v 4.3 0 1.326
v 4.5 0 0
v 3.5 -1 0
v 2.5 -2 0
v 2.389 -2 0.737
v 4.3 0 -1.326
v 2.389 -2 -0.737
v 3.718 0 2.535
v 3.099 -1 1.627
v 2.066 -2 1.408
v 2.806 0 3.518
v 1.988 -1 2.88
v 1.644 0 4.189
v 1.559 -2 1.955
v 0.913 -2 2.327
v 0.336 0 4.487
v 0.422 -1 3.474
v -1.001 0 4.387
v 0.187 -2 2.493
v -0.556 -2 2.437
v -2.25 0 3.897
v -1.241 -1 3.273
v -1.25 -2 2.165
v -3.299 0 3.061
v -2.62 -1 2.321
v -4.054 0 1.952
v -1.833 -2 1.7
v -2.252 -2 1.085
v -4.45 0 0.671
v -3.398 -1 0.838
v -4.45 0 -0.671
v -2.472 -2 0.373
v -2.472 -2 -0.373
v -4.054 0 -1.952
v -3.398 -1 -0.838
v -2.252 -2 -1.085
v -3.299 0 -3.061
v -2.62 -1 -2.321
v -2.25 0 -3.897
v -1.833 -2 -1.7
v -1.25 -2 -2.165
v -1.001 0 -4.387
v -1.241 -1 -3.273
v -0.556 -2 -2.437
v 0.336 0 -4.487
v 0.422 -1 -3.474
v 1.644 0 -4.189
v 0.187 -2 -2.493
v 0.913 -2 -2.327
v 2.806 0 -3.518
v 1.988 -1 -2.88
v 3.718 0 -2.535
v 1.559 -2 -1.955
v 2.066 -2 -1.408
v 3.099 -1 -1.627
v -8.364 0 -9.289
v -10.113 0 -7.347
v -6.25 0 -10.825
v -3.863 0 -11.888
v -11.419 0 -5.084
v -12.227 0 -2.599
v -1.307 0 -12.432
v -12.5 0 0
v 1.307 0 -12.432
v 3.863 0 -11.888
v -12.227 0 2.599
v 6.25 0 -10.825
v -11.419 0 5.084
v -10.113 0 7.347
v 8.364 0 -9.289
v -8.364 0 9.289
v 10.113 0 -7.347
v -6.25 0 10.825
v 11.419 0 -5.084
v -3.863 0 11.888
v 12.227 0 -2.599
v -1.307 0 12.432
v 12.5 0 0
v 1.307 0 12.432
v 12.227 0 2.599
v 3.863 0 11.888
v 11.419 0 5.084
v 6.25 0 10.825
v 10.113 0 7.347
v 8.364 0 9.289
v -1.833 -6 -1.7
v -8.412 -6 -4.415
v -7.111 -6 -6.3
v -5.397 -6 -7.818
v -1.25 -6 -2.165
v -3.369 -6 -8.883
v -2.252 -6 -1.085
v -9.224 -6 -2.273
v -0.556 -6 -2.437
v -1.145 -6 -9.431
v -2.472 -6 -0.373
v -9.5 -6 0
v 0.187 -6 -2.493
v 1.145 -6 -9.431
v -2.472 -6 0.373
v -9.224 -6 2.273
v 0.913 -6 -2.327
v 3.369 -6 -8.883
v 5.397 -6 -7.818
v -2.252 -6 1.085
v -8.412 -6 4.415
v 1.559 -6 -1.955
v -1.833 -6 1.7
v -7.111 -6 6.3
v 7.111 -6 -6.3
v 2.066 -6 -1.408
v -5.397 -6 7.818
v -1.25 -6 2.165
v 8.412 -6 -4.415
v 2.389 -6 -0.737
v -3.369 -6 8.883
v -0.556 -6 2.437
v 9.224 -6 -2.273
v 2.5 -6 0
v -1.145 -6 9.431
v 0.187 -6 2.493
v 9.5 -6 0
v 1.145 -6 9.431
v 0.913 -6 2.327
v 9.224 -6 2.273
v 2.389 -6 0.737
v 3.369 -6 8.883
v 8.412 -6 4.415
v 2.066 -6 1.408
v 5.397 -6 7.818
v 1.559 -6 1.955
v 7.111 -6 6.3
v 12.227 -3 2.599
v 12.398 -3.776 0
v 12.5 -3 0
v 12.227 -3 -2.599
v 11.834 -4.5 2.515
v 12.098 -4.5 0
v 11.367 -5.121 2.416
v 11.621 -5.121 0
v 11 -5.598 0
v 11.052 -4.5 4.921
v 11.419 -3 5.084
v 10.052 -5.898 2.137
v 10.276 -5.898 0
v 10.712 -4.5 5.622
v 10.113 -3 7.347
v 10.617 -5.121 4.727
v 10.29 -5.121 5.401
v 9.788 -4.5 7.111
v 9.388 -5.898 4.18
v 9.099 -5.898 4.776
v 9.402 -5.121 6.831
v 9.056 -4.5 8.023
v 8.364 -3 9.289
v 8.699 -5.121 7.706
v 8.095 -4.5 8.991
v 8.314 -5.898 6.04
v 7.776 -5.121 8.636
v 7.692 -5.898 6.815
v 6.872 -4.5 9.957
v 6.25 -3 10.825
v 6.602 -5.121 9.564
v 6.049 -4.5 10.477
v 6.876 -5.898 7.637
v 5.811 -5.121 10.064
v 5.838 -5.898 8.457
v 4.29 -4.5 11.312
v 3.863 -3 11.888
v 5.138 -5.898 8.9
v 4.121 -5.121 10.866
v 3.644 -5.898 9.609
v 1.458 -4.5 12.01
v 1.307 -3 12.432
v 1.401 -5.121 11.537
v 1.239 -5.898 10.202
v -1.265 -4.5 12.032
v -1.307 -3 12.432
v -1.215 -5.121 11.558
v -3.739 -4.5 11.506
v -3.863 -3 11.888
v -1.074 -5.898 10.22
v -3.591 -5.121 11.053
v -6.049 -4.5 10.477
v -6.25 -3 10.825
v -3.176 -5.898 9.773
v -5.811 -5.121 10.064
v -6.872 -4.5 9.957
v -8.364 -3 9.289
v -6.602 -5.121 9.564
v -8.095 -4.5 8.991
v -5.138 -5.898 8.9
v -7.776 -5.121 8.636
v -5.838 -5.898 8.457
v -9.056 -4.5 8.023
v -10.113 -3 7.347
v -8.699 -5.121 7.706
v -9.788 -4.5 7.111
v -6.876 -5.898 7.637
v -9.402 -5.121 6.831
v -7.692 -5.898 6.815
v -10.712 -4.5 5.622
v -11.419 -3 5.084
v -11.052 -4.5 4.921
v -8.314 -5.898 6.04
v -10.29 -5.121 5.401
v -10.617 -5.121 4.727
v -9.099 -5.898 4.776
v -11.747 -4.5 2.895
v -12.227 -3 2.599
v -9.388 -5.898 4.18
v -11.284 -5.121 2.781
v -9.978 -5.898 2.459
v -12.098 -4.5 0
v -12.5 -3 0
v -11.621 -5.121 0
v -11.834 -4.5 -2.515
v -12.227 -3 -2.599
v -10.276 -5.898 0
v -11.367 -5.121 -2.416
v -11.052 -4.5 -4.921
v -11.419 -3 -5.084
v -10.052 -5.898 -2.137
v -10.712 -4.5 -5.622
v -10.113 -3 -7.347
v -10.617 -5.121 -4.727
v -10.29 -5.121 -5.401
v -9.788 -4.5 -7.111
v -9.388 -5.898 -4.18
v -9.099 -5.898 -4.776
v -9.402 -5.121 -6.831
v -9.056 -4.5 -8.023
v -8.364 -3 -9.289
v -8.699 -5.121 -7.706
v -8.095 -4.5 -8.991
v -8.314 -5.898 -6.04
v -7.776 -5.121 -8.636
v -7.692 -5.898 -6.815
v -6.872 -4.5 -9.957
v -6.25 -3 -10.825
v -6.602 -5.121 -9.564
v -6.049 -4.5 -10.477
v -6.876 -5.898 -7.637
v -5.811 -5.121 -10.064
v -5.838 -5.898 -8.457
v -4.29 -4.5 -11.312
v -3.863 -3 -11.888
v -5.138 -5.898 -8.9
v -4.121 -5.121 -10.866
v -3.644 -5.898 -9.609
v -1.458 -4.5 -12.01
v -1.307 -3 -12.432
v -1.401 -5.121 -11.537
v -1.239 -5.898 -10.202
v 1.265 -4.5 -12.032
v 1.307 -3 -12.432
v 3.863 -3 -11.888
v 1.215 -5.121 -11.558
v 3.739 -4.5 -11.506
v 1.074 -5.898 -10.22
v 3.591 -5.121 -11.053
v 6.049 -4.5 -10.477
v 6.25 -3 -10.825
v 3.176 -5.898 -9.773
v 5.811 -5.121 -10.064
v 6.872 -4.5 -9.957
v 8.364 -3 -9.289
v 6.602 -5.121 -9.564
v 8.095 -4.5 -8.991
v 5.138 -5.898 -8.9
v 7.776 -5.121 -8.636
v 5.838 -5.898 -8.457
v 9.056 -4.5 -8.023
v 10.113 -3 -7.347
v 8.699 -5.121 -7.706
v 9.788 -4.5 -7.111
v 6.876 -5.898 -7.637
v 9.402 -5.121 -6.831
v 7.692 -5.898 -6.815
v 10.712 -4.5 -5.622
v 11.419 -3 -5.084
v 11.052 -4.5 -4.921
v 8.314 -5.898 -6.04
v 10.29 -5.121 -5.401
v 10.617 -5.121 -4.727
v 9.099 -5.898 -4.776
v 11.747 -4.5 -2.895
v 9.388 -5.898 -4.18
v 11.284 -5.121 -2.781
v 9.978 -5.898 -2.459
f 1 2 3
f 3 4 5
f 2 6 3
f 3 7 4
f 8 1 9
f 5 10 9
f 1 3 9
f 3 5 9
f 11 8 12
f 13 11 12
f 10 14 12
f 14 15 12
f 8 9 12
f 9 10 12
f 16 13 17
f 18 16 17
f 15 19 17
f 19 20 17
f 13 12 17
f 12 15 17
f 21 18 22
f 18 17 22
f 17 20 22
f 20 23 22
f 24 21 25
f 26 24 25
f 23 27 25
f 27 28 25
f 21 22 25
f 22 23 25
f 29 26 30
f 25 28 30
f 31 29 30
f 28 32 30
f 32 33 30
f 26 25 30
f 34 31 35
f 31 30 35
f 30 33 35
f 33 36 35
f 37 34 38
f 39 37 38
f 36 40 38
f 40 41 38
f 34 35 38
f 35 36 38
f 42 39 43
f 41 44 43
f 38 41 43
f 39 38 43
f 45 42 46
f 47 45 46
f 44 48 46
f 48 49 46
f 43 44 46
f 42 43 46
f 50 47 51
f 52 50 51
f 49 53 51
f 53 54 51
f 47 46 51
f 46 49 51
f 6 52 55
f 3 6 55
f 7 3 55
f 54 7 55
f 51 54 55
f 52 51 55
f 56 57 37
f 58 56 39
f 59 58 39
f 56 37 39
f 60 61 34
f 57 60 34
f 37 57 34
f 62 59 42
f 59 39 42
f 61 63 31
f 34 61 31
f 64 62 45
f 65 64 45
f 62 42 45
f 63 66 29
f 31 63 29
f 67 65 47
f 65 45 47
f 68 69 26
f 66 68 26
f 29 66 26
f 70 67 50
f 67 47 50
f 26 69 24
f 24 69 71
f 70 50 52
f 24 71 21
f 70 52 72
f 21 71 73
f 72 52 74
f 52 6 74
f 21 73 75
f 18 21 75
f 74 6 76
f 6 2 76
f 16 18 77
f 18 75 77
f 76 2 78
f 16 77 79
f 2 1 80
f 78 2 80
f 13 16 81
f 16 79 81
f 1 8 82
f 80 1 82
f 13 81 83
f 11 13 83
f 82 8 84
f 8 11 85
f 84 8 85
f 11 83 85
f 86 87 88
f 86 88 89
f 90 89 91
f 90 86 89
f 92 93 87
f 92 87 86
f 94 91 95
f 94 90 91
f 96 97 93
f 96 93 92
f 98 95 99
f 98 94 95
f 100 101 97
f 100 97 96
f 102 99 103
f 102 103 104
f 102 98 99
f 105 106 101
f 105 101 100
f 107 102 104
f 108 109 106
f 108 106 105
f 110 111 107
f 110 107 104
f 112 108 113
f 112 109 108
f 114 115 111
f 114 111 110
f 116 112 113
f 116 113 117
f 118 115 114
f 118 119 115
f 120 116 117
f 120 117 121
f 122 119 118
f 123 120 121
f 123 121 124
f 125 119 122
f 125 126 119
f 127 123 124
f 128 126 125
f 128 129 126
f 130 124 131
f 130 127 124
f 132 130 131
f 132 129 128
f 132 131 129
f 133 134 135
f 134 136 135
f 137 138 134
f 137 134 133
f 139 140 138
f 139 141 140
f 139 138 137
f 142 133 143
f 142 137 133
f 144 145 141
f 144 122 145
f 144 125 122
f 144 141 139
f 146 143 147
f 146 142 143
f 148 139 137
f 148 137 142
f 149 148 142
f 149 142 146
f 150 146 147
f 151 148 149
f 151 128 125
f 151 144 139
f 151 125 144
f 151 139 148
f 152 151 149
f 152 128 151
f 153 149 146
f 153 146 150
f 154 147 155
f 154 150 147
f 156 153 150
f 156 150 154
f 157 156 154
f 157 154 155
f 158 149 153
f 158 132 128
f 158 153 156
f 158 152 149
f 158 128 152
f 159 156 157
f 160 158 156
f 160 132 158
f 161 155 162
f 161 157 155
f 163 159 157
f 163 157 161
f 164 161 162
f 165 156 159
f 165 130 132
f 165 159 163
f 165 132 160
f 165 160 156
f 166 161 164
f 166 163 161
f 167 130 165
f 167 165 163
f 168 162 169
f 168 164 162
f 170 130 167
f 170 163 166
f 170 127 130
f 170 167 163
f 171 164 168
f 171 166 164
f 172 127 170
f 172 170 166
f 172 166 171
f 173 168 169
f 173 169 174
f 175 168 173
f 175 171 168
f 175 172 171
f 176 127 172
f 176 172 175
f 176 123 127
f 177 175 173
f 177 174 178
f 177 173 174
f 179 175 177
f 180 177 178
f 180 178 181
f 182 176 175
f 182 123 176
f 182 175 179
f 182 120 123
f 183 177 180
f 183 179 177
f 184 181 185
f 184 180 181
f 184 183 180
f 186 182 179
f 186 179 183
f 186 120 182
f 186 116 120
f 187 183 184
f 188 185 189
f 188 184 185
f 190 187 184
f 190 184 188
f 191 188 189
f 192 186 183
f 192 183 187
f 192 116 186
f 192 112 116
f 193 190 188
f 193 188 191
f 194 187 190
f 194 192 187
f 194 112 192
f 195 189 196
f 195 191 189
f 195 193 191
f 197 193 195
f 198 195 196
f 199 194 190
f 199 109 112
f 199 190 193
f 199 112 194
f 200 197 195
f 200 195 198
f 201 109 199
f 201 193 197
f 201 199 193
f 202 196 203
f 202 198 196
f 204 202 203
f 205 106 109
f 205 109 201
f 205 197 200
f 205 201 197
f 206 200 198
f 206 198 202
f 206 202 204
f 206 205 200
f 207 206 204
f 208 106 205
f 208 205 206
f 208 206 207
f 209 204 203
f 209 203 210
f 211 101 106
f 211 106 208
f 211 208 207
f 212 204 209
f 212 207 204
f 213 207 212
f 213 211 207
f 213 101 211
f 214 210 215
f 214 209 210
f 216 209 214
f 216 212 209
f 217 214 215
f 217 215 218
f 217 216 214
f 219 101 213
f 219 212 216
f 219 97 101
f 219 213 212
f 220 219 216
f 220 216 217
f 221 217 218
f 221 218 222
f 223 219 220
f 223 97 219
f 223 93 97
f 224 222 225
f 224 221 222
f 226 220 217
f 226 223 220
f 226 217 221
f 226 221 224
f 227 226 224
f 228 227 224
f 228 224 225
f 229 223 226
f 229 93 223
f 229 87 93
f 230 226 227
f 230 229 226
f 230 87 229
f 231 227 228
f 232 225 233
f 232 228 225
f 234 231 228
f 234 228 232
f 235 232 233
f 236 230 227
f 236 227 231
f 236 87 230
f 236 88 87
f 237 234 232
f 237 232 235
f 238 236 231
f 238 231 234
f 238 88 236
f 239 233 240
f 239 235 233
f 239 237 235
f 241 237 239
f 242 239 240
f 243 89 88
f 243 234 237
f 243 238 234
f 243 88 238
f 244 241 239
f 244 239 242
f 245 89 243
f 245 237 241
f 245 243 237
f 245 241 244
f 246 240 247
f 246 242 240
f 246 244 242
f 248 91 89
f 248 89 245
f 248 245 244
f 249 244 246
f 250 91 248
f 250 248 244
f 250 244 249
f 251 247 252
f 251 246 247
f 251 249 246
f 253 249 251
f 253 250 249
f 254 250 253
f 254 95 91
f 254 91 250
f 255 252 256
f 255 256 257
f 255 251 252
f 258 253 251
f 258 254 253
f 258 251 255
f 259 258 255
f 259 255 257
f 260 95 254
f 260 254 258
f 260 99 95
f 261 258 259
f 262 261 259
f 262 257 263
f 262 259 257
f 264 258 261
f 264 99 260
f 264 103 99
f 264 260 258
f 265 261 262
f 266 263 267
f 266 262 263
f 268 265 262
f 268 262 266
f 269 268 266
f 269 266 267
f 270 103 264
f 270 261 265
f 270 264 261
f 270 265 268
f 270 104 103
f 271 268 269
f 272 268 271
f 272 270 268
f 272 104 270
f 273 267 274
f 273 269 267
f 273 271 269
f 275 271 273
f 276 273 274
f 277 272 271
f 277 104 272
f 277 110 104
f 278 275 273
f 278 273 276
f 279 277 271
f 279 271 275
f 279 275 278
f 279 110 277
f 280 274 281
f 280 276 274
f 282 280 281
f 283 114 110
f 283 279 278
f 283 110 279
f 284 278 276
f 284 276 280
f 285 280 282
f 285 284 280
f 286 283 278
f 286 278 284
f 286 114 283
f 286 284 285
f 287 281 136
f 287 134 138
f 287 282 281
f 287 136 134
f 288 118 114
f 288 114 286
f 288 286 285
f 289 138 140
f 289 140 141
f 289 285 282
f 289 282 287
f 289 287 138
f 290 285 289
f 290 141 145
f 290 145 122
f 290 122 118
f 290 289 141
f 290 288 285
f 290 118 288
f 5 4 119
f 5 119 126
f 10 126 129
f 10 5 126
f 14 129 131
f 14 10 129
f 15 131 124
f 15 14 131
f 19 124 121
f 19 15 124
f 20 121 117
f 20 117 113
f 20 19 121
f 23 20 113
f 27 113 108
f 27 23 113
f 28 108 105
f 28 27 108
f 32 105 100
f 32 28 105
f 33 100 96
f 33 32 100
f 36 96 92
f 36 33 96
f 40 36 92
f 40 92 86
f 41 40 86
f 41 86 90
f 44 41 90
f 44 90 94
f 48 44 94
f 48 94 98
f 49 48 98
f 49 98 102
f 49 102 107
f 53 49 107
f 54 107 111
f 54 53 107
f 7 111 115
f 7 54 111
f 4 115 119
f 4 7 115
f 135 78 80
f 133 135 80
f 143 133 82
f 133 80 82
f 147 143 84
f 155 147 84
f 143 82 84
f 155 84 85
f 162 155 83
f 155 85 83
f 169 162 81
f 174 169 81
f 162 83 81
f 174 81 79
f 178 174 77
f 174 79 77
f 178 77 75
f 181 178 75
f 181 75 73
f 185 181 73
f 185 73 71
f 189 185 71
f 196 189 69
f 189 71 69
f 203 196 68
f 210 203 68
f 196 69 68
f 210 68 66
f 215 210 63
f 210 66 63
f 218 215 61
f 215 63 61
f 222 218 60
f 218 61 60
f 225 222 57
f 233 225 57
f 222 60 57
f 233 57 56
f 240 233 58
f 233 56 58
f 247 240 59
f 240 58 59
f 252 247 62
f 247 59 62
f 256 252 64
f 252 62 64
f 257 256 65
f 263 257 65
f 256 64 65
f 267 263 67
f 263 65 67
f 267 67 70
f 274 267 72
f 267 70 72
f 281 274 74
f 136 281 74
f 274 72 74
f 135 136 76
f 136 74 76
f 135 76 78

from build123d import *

# Parameters (mm, degrees)
F0_R     = 12.5
F0_R_2   = 2.5
F1_DEPTH = 6
F2_R     = 3
F3_SIZE  = 2


with BuildPart() as f1:
    # F0 (on Front) → F1 (new body)
    with BuildSketch(Plane.XZ):
        Circle(F0_R)
        Circle(F0_R_2, mode=Mode.SUBTRACT)
    extrude(amount=F1_DEPTH)

    # F2
    f2_edges = [f1.edges().sort_by_distance(p)[0] for p in [
        (-12.5, -6, 0),
    ]]
    fillet(f2_edges, radius=F2_R)

    # F3
    f3_edges = [f1.edges().sort_by_distance(p)[0] for p in [
        (-2.5, 0, 0),
    ]]
    chamfer(f3_edges, length=F3_SIZE)


solid = f1.part
